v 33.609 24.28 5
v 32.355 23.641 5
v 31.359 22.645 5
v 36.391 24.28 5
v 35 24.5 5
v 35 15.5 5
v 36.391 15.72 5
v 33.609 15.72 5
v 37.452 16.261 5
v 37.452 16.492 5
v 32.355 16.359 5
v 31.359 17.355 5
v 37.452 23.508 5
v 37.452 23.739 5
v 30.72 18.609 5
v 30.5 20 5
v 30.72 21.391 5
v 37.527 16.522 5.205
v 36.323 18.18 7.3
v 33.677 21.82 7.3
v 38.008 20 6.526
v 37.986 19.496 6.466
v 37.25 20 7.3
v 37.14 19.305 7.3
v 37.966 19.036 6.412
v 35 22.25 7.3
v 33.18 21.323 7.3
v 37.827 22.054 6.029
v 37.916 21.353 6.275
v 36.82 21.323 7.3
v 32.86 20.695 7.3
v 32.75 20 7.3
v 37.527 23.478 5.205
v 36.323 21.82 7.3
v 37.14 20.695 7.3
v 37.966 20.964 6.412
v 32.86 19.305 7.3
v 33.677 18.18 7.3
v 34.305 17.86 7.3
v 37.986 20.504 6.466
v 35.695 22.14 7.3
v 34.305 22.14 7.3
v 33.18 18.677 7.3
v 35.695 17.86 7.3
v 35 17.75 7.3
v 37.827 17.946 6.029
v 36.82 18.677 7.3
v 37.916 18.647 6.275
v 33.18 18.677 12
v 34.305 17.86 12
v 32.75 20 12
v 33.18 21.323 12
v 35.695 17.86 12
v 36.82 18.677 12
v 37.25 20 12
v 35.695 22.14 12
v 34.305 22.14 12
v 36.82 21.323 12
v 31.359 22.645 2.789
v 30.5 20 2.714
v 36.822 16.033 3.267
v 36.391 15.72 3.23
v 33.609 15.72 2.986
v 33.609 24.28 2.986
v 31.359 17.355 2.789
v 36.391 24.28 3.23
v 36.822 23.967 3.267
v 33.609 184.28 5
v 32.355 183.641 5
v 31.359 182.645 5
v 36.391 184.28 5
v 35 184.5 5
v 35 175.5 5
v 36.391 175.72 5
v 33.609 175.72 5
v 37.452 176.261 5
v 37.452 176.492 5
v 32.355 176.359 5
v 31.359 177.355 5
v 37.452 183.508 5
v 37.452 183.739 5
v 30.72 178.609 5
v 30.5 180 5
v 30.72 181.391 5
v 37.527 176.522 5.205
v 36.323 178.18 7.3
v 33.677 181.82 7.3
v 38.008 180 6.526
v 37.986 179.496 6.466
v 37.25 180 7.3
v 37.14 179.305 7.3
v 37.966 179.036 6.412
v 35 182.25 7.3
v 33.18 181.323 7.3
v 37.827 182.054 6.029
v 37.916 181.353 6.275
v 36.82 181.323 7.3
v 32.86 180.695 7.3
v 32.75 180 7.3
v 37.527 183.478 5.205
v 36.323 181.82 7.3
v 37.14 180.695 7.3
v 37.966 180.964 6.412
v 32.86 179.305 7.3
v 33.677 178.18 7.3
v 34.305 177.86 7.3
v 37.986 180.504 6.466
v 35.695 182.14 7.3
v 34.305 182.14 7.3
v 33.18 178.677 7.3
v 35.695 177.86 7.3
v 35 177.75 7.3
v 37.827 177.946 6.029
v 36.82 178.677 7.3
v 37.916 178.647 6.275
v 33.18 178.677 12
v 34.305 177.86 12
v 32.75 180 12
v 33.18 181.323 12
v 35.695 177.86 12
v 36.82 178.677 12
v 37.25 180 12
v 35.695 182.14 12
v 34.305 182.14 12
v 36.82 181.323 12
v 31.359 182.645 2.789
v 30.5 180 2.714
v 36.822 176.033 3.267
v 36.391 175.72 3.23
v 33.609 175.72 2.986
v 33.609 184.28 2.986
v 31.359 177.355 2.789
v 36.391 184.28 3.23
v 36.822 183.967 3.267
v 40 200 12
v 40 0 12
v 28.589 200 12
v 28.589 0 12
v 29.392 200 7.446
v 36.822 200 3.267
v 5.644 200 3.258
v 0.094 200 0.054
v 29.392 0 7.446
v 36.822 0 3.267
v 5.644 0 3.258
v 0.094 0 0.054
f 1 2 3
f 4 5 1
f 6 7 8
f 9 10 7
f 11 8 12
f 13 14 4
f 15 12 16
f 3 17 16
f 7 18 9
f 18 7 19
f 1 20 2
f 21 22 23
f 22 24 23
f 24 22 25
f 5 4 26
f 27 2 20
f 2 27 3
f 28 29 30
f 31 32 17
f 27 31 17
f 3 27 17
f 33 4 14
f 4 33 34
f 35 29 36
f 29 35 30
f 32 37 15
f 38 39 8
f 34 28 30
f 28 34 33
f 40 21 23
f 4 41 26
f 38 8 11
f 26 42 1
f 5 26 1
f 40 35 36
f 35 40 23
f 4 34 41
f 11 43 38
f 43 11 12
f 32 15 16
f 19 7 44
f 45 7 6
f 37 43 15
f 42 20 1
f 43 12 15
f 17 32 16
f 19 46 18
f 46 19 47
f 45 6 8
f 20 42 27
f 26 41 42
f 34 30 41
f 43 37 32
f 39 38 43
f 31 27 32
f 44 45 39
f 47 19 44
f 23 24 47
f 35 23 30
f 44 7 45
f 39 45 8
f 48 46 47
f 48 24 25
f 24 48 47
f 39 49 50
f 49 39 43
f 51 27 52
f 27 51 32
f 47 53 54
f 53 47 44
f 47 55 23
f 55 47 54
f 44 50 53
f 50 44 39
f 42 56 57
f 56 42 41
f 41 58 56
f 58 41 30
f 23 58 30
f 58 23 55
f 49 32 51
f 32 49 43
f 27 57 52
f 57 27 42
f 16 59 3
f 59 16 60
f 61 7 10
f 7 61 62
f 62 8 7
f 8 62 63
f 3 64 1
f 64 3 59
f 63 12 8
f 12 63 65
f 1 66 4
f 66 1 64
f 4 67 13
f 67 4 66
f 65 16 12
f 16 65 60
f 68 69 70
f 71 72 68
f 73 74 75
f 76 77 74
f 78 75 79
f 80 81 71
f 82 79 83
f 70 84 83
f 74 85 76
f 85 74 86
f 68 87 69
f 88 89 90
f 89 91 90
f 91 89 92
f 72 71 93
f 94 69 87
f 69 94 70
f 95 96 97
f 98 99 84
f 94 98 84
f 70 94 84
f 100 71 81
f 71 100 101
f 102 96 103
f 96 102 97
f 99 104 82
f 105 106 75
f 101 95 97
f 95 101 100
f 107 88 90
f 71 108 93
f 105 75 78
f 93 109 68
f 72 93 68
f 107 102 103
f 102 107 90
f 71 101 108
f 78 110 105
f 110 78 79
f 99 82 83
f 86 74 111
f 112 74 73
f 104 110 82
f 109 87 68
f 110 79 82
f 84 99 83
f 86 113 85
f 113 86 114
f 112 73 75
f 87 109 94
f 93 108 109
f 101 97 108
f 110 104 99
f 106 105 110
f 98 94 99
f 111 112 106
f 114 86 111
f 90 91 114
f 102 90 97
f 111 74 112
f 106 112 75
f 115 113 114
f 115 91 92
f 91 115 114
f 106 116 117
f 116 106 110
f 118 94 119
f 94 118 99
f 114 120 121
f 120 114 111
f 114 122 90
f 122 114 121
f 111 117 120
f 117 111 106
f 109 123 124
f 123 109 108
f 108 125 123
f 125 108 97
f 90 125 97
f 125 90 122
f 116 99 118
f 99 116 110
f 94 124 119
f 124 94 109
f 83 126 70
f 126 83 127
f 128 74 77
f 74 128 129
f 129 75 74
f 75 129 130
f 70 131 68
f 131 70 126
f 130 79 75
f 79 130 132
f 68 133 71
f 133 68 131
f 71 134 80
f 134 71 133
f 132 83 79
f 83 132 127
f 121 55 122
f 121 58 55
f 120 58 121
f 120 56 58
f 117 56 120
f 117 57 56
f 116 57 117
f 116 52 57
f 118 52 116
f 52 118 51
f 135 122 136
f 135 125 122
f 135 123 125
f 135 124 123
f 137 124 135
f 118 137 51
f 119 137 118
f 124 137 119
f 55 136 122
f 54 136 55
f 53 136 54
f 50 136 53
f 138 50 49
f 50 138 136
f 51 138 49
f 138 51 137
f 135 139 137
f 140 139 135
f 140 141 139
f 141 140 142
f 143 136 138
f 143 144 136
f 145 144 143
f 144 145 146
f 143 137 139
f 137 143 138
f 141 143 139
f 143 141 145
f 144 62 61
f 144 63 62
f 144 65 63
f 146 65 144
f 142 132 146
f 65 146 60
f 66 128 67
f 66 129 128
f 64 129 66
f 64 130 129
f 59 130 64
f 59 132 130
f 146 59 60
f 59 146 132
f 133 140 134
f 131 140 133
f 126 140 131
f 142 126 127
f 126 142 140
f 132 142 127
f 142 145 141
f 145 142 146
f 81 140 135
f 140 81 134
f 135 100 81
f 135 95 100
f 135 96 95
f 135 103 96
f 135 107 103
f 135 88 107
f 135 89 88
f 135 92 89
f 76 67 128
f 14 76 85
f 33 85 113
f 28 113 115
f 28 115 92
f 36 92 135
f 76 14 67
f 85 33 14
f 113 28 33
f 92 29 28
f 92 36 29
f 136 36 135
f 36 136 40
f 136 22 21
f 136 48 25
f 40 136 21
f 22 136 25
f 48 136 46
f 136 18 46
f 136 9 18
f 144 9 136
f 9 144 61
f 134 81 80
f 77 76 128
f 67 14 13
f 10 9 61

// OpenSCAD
// file: modules/Modules.scad
/*
	This program is free software: you can redistribute it and/or modify
	it under the terms of the GNU General Public License as published by
	the Free Software Foundation, either version 3 of the License, or
	(at your option) any later version.

	This program is distributed in the hope that it will be useful,
	but WITHOUT ANY WARRANTY; without even the implied warranty of
	MERCHANTABILITY or FITNESS FOR A PARTICULAR PURPOSE.  See the
	GNU General Public License for more details.
	
	Purpose:  Hold general use modules for to simplify making of objects
	
	History:	
		01/25/2024	Initial creation
		02/17/2025	Added modules for roundedCube, roundedCylinder
								and FilletedCylinder

*/

/***********************************************************************
****** Module - screwHole
	Create a hole specifically for a screw to go in.
***********************************************************************/
//screwHole();
module screwHole(screwHole=4.5, screwDepth = 10, screwHead = 9, headTaper = 2.3, screwHeadDepth = 5){
	// Common size screws
	
    translate([0,0,-headTaper])cylinder(d1=screwHole, d2=screwHead, h = headTaper, $fn=20);
    translate([0,0,-headTaper-screwDepth])cylinder(d=screwHole, h=screwDepth, $fn=10);
    translate([0,0,-headTaper-screwDepth])cylinder(d=screwHole, h=screwDepth, $fn=10);
    translate([0,0,0]) cylinder(d=screwHead, h=screwHeadDepth, $fn=10);
}

/***********************************************************************
****** Module - roundedCube
	4 various ways to make a cube with soft rounded sides.
***********************************************************************/
//roundedCube(x=50, y=30, z=20, r=5, xyz="x");
//roundedCube(x=50, y=30, z=20, r=5, xyz="y");
//roundedCube(x=50, y=30, z=20, r=5, xyz="z");
//roundedCube(x=50, y=30, z=20, r=5, xyz="all");
module roundedCube(x=50, y=30, z=20, r=5, xyz="z"){
	hull(){
		if (xyz == "z") {
			translate([r,r,0])cylinder(h=z, r=r);
			translate([x-r,r,0])cylinder(h=z, r=r);
			translate([r,y-r,0])cylinder(h=z, r=r);
			translate([x-r,y-r,0])cylinder(h=z, r=r);
		} else if (xyz == "y") {
			translate([r,0,r])rotate([-90,0,0])cylinder(h=y, r=r);
			translate([x-r,0,r])rotate([-90,0,0])cylinder(h=y, r=r);
			translate([r,0,z-r])rotate([-90,0,0])cylinder(h=y, r=r);
			translate([x-r,0,z-r])rotate([-90,0,0])cylinder(h=y, r=r);
		} else if (xyz == "x") {
			translate([0,r,r])rotate([0,90,0])cylinder(h=x, r=r);
			translate([0,y-r,r])rotate([0,90,0])cylinder(h=x, r=r);
			translate([0,r,z-r])rotate([0,90,0])cylinder(h=x, r=r);
			translate([0,y-r,z-r])rotate([0,90,0])cylinder(h=x, r=r);
		} else if (xyz == "all") {
			minkowski(){
				translate([r,r,r])cube([x-r*2,y-r*2,z-r*2]);
				sphere(r=r);
			}			
		} else { 
			echo("XYZ not set");
		}
	}
}

/***********************************************************************
******* Module - roundedCylinder
	Create a cylinder with nice rounded outter top and bottom
***********************************************************************/
//roundedCylinder();
//roundedCylinder(d=200, h=100, r=5);
//difference(){roundedCylinder(d=20, h=10, r=1, s=60);filletedCylinder(d=5, h=10, tr=2, br=1, pad=0, s=30);}
module roundedCylinder(d=200, h=100, r=5, s=$fn){
	$fn = s;
	hull(){
		translate([0,0,r])rotate_extrude()translate([d/2-r,0,0])circle(r=r);
		translate([0,0,h-r])rotate_extrude()translate([d/2-r,0,0])circle(r=r);
	}
}

/***********************************************************************
******* Module - filletedCylinder
	Create a cylinder with flared top and/or bottoms.
	Used for making rounded top/bottom holes in objects.
***********************************************************************/
//filletedCylinder();
//filletedCylinder(d=10, h=20, tr=1, br=1, pad=.1, s=60);
//difference(){roundedCylinder(d=200, h=100, r=5);filletedCylinder(d=50, h=100, tr=10, br=5, pad=5);}
//difference(){roundedCylinder(d=20, h=10, r=1, s=30);filletedCylinder(d=5, h=10, tr=2, br=1, pad=0, s=30);}
module filletedCylinder(d=50, h=100, tr=10, br=5, pad=5, s=$fn){
	$fn = s;
	shift = .1;
	translate([0,0,-shift])cylinder(h=h+shift*2, r=d/2);
	if ( br > 0 ){
		// bottom
		translate([0,0,-shift])
			difference(){
				rotate_extrude()translate([d/2-pad,0,0])square([br+pad, br]);
				rotate_extrude()translate([d/2+br,br,0])circle(r=br);
			}
	}
	if ( tr > 0 ){
		// top
		translate([0,0,h-tr+shift])
			difference(){
				rotate_extrude()translate([d/2-pad,0,0])square([tr+pad, tr]);
				rotate_extrude()translate([d/2+tr,0,0])circle(r=tr);
			}
	}
}

/***********************************************************************
******* Module - CylinderFillet
***********************************************************************/
//difference(){cylinder(h=20, d=100);cylinderFillet(d = 100, r=5);}
/*difference(){
	cylinder(h=20, d=100);
	cylinderFillet(d = 100, r=5);
	translate([0,0,20])rotate([180,0,0])cylinderFillet(d = 100, r=5, s=60);
}*/
module cylinderFillet(d = 100, r=5, s=$fn){
		$fn = s;
		pad = 0.1;	// Padding to maintain manifold
		translate([0,0,0])
		difference() {
				rotate_extrude(convexity=10)
						translate([d/2-r+pad,-pad,0])
								square(r+pad,r+pad);
				#rotate_extrude(convexity=10)
						translate([d/2-r,r,0])
								circle(r=r);
		}
}
// main file
/*
	This program is free software: you can redistribute it and/or modify
	it under the terms of the GNU General Public License as published by
	the Free Software Foundation, either version 3 of the License, or
	(at your option) any later version.

	This program is distributed in the hope that it will be useful,
	but WITHOUT ANY WARRANTY; without even the implied warranty of
	MERCHANTABILITY or FITNESS FOR A PARTICULAR PURPOSE.  See the
	GNU General Public License for more details.
	
	Purpose:  
	
	History:	
		MM/DD/YYYY	Initial creation

	Notes:
		- Nothing special see inline notes below

*/

/****** Variables ******************************************************
***********************************************************************/

length = 200;       // total lenght
width = 40;         // total width
height = 12;        // total height
base = 10;          // offset approximate width of base
thickness = .5;     // how thick is the main part, but that is not a real number...
slopeInner = 10;    // degrees of angle for inner cutout
slopeOutter = 5;    // degrees of angle for the outter (bottom)side
innerBevel = 30;    // degrees of angle for the inside bevel
outterBevel = 20;   // angle to remove some outside material
screwOffset = 20;   // how far to move the srew in from the end
screwDepth = 5;     // how deep to set the screw

// Special variables
$fn = $preview ? 32 : 64;		// 0 is OpenSCAD default

/****** Imports & Includes & Calculations ******************************
***********************************************************************/
include <modules/Modules.scad>

// Calculations


/****** The Object *****************************************************
***********************************************************************/

object();

module object(length=length){
	difference(){
			cube([width, length, height]);
			// Remove the top inner section
			translate([-base,0,thickness]) rotate([0,-slopeInner,0]) cube([width, length, height]);
			// Remove the bottom slope
			translate([0,0,-height]) rotate([0,-slopeOutter,0]) cube([width*2, length, height]);
			// Remove the inner bevel
			translate([0,0,0]) rotate([0,-innerBevel,0]) cube([width, length, height]);
			// Remove the outter bevel
			translate([width,0,height]) rotate([0,outterBevel+90,0]) cube([width, length, height*2]);
			// Remove the front screw
			translate([width-(base/2),screwOffset,screwDepth]) rotate([180,0,0]) screwHole();  // Screw hole
			translate([width-(base/2),length-screwOffset,screwDepth]) rotate([180,0,0]) screwHole();  // Screw head
	}
}

/****** Batch Export***************************************************
	Use this module to create multiple exports based on rerenderd values
	https://github.com/18107/OpenSCAD-batch-export-stl
	<modules/export.py>
	
	This script searches for "module export()" and individually renders
	and exports each item in it. Each item is expected to be on its own line. 
	The file name will be the comment on the same line, or the module 
	call if no comment exists. All files will be put in a folder with 
	the same name as the scad file it's created from.
***********************************************************************/
module export() {
	object(100); //WineRack-100
	object(150); //WineRack-150
	object(200); //WineRack-200
}
